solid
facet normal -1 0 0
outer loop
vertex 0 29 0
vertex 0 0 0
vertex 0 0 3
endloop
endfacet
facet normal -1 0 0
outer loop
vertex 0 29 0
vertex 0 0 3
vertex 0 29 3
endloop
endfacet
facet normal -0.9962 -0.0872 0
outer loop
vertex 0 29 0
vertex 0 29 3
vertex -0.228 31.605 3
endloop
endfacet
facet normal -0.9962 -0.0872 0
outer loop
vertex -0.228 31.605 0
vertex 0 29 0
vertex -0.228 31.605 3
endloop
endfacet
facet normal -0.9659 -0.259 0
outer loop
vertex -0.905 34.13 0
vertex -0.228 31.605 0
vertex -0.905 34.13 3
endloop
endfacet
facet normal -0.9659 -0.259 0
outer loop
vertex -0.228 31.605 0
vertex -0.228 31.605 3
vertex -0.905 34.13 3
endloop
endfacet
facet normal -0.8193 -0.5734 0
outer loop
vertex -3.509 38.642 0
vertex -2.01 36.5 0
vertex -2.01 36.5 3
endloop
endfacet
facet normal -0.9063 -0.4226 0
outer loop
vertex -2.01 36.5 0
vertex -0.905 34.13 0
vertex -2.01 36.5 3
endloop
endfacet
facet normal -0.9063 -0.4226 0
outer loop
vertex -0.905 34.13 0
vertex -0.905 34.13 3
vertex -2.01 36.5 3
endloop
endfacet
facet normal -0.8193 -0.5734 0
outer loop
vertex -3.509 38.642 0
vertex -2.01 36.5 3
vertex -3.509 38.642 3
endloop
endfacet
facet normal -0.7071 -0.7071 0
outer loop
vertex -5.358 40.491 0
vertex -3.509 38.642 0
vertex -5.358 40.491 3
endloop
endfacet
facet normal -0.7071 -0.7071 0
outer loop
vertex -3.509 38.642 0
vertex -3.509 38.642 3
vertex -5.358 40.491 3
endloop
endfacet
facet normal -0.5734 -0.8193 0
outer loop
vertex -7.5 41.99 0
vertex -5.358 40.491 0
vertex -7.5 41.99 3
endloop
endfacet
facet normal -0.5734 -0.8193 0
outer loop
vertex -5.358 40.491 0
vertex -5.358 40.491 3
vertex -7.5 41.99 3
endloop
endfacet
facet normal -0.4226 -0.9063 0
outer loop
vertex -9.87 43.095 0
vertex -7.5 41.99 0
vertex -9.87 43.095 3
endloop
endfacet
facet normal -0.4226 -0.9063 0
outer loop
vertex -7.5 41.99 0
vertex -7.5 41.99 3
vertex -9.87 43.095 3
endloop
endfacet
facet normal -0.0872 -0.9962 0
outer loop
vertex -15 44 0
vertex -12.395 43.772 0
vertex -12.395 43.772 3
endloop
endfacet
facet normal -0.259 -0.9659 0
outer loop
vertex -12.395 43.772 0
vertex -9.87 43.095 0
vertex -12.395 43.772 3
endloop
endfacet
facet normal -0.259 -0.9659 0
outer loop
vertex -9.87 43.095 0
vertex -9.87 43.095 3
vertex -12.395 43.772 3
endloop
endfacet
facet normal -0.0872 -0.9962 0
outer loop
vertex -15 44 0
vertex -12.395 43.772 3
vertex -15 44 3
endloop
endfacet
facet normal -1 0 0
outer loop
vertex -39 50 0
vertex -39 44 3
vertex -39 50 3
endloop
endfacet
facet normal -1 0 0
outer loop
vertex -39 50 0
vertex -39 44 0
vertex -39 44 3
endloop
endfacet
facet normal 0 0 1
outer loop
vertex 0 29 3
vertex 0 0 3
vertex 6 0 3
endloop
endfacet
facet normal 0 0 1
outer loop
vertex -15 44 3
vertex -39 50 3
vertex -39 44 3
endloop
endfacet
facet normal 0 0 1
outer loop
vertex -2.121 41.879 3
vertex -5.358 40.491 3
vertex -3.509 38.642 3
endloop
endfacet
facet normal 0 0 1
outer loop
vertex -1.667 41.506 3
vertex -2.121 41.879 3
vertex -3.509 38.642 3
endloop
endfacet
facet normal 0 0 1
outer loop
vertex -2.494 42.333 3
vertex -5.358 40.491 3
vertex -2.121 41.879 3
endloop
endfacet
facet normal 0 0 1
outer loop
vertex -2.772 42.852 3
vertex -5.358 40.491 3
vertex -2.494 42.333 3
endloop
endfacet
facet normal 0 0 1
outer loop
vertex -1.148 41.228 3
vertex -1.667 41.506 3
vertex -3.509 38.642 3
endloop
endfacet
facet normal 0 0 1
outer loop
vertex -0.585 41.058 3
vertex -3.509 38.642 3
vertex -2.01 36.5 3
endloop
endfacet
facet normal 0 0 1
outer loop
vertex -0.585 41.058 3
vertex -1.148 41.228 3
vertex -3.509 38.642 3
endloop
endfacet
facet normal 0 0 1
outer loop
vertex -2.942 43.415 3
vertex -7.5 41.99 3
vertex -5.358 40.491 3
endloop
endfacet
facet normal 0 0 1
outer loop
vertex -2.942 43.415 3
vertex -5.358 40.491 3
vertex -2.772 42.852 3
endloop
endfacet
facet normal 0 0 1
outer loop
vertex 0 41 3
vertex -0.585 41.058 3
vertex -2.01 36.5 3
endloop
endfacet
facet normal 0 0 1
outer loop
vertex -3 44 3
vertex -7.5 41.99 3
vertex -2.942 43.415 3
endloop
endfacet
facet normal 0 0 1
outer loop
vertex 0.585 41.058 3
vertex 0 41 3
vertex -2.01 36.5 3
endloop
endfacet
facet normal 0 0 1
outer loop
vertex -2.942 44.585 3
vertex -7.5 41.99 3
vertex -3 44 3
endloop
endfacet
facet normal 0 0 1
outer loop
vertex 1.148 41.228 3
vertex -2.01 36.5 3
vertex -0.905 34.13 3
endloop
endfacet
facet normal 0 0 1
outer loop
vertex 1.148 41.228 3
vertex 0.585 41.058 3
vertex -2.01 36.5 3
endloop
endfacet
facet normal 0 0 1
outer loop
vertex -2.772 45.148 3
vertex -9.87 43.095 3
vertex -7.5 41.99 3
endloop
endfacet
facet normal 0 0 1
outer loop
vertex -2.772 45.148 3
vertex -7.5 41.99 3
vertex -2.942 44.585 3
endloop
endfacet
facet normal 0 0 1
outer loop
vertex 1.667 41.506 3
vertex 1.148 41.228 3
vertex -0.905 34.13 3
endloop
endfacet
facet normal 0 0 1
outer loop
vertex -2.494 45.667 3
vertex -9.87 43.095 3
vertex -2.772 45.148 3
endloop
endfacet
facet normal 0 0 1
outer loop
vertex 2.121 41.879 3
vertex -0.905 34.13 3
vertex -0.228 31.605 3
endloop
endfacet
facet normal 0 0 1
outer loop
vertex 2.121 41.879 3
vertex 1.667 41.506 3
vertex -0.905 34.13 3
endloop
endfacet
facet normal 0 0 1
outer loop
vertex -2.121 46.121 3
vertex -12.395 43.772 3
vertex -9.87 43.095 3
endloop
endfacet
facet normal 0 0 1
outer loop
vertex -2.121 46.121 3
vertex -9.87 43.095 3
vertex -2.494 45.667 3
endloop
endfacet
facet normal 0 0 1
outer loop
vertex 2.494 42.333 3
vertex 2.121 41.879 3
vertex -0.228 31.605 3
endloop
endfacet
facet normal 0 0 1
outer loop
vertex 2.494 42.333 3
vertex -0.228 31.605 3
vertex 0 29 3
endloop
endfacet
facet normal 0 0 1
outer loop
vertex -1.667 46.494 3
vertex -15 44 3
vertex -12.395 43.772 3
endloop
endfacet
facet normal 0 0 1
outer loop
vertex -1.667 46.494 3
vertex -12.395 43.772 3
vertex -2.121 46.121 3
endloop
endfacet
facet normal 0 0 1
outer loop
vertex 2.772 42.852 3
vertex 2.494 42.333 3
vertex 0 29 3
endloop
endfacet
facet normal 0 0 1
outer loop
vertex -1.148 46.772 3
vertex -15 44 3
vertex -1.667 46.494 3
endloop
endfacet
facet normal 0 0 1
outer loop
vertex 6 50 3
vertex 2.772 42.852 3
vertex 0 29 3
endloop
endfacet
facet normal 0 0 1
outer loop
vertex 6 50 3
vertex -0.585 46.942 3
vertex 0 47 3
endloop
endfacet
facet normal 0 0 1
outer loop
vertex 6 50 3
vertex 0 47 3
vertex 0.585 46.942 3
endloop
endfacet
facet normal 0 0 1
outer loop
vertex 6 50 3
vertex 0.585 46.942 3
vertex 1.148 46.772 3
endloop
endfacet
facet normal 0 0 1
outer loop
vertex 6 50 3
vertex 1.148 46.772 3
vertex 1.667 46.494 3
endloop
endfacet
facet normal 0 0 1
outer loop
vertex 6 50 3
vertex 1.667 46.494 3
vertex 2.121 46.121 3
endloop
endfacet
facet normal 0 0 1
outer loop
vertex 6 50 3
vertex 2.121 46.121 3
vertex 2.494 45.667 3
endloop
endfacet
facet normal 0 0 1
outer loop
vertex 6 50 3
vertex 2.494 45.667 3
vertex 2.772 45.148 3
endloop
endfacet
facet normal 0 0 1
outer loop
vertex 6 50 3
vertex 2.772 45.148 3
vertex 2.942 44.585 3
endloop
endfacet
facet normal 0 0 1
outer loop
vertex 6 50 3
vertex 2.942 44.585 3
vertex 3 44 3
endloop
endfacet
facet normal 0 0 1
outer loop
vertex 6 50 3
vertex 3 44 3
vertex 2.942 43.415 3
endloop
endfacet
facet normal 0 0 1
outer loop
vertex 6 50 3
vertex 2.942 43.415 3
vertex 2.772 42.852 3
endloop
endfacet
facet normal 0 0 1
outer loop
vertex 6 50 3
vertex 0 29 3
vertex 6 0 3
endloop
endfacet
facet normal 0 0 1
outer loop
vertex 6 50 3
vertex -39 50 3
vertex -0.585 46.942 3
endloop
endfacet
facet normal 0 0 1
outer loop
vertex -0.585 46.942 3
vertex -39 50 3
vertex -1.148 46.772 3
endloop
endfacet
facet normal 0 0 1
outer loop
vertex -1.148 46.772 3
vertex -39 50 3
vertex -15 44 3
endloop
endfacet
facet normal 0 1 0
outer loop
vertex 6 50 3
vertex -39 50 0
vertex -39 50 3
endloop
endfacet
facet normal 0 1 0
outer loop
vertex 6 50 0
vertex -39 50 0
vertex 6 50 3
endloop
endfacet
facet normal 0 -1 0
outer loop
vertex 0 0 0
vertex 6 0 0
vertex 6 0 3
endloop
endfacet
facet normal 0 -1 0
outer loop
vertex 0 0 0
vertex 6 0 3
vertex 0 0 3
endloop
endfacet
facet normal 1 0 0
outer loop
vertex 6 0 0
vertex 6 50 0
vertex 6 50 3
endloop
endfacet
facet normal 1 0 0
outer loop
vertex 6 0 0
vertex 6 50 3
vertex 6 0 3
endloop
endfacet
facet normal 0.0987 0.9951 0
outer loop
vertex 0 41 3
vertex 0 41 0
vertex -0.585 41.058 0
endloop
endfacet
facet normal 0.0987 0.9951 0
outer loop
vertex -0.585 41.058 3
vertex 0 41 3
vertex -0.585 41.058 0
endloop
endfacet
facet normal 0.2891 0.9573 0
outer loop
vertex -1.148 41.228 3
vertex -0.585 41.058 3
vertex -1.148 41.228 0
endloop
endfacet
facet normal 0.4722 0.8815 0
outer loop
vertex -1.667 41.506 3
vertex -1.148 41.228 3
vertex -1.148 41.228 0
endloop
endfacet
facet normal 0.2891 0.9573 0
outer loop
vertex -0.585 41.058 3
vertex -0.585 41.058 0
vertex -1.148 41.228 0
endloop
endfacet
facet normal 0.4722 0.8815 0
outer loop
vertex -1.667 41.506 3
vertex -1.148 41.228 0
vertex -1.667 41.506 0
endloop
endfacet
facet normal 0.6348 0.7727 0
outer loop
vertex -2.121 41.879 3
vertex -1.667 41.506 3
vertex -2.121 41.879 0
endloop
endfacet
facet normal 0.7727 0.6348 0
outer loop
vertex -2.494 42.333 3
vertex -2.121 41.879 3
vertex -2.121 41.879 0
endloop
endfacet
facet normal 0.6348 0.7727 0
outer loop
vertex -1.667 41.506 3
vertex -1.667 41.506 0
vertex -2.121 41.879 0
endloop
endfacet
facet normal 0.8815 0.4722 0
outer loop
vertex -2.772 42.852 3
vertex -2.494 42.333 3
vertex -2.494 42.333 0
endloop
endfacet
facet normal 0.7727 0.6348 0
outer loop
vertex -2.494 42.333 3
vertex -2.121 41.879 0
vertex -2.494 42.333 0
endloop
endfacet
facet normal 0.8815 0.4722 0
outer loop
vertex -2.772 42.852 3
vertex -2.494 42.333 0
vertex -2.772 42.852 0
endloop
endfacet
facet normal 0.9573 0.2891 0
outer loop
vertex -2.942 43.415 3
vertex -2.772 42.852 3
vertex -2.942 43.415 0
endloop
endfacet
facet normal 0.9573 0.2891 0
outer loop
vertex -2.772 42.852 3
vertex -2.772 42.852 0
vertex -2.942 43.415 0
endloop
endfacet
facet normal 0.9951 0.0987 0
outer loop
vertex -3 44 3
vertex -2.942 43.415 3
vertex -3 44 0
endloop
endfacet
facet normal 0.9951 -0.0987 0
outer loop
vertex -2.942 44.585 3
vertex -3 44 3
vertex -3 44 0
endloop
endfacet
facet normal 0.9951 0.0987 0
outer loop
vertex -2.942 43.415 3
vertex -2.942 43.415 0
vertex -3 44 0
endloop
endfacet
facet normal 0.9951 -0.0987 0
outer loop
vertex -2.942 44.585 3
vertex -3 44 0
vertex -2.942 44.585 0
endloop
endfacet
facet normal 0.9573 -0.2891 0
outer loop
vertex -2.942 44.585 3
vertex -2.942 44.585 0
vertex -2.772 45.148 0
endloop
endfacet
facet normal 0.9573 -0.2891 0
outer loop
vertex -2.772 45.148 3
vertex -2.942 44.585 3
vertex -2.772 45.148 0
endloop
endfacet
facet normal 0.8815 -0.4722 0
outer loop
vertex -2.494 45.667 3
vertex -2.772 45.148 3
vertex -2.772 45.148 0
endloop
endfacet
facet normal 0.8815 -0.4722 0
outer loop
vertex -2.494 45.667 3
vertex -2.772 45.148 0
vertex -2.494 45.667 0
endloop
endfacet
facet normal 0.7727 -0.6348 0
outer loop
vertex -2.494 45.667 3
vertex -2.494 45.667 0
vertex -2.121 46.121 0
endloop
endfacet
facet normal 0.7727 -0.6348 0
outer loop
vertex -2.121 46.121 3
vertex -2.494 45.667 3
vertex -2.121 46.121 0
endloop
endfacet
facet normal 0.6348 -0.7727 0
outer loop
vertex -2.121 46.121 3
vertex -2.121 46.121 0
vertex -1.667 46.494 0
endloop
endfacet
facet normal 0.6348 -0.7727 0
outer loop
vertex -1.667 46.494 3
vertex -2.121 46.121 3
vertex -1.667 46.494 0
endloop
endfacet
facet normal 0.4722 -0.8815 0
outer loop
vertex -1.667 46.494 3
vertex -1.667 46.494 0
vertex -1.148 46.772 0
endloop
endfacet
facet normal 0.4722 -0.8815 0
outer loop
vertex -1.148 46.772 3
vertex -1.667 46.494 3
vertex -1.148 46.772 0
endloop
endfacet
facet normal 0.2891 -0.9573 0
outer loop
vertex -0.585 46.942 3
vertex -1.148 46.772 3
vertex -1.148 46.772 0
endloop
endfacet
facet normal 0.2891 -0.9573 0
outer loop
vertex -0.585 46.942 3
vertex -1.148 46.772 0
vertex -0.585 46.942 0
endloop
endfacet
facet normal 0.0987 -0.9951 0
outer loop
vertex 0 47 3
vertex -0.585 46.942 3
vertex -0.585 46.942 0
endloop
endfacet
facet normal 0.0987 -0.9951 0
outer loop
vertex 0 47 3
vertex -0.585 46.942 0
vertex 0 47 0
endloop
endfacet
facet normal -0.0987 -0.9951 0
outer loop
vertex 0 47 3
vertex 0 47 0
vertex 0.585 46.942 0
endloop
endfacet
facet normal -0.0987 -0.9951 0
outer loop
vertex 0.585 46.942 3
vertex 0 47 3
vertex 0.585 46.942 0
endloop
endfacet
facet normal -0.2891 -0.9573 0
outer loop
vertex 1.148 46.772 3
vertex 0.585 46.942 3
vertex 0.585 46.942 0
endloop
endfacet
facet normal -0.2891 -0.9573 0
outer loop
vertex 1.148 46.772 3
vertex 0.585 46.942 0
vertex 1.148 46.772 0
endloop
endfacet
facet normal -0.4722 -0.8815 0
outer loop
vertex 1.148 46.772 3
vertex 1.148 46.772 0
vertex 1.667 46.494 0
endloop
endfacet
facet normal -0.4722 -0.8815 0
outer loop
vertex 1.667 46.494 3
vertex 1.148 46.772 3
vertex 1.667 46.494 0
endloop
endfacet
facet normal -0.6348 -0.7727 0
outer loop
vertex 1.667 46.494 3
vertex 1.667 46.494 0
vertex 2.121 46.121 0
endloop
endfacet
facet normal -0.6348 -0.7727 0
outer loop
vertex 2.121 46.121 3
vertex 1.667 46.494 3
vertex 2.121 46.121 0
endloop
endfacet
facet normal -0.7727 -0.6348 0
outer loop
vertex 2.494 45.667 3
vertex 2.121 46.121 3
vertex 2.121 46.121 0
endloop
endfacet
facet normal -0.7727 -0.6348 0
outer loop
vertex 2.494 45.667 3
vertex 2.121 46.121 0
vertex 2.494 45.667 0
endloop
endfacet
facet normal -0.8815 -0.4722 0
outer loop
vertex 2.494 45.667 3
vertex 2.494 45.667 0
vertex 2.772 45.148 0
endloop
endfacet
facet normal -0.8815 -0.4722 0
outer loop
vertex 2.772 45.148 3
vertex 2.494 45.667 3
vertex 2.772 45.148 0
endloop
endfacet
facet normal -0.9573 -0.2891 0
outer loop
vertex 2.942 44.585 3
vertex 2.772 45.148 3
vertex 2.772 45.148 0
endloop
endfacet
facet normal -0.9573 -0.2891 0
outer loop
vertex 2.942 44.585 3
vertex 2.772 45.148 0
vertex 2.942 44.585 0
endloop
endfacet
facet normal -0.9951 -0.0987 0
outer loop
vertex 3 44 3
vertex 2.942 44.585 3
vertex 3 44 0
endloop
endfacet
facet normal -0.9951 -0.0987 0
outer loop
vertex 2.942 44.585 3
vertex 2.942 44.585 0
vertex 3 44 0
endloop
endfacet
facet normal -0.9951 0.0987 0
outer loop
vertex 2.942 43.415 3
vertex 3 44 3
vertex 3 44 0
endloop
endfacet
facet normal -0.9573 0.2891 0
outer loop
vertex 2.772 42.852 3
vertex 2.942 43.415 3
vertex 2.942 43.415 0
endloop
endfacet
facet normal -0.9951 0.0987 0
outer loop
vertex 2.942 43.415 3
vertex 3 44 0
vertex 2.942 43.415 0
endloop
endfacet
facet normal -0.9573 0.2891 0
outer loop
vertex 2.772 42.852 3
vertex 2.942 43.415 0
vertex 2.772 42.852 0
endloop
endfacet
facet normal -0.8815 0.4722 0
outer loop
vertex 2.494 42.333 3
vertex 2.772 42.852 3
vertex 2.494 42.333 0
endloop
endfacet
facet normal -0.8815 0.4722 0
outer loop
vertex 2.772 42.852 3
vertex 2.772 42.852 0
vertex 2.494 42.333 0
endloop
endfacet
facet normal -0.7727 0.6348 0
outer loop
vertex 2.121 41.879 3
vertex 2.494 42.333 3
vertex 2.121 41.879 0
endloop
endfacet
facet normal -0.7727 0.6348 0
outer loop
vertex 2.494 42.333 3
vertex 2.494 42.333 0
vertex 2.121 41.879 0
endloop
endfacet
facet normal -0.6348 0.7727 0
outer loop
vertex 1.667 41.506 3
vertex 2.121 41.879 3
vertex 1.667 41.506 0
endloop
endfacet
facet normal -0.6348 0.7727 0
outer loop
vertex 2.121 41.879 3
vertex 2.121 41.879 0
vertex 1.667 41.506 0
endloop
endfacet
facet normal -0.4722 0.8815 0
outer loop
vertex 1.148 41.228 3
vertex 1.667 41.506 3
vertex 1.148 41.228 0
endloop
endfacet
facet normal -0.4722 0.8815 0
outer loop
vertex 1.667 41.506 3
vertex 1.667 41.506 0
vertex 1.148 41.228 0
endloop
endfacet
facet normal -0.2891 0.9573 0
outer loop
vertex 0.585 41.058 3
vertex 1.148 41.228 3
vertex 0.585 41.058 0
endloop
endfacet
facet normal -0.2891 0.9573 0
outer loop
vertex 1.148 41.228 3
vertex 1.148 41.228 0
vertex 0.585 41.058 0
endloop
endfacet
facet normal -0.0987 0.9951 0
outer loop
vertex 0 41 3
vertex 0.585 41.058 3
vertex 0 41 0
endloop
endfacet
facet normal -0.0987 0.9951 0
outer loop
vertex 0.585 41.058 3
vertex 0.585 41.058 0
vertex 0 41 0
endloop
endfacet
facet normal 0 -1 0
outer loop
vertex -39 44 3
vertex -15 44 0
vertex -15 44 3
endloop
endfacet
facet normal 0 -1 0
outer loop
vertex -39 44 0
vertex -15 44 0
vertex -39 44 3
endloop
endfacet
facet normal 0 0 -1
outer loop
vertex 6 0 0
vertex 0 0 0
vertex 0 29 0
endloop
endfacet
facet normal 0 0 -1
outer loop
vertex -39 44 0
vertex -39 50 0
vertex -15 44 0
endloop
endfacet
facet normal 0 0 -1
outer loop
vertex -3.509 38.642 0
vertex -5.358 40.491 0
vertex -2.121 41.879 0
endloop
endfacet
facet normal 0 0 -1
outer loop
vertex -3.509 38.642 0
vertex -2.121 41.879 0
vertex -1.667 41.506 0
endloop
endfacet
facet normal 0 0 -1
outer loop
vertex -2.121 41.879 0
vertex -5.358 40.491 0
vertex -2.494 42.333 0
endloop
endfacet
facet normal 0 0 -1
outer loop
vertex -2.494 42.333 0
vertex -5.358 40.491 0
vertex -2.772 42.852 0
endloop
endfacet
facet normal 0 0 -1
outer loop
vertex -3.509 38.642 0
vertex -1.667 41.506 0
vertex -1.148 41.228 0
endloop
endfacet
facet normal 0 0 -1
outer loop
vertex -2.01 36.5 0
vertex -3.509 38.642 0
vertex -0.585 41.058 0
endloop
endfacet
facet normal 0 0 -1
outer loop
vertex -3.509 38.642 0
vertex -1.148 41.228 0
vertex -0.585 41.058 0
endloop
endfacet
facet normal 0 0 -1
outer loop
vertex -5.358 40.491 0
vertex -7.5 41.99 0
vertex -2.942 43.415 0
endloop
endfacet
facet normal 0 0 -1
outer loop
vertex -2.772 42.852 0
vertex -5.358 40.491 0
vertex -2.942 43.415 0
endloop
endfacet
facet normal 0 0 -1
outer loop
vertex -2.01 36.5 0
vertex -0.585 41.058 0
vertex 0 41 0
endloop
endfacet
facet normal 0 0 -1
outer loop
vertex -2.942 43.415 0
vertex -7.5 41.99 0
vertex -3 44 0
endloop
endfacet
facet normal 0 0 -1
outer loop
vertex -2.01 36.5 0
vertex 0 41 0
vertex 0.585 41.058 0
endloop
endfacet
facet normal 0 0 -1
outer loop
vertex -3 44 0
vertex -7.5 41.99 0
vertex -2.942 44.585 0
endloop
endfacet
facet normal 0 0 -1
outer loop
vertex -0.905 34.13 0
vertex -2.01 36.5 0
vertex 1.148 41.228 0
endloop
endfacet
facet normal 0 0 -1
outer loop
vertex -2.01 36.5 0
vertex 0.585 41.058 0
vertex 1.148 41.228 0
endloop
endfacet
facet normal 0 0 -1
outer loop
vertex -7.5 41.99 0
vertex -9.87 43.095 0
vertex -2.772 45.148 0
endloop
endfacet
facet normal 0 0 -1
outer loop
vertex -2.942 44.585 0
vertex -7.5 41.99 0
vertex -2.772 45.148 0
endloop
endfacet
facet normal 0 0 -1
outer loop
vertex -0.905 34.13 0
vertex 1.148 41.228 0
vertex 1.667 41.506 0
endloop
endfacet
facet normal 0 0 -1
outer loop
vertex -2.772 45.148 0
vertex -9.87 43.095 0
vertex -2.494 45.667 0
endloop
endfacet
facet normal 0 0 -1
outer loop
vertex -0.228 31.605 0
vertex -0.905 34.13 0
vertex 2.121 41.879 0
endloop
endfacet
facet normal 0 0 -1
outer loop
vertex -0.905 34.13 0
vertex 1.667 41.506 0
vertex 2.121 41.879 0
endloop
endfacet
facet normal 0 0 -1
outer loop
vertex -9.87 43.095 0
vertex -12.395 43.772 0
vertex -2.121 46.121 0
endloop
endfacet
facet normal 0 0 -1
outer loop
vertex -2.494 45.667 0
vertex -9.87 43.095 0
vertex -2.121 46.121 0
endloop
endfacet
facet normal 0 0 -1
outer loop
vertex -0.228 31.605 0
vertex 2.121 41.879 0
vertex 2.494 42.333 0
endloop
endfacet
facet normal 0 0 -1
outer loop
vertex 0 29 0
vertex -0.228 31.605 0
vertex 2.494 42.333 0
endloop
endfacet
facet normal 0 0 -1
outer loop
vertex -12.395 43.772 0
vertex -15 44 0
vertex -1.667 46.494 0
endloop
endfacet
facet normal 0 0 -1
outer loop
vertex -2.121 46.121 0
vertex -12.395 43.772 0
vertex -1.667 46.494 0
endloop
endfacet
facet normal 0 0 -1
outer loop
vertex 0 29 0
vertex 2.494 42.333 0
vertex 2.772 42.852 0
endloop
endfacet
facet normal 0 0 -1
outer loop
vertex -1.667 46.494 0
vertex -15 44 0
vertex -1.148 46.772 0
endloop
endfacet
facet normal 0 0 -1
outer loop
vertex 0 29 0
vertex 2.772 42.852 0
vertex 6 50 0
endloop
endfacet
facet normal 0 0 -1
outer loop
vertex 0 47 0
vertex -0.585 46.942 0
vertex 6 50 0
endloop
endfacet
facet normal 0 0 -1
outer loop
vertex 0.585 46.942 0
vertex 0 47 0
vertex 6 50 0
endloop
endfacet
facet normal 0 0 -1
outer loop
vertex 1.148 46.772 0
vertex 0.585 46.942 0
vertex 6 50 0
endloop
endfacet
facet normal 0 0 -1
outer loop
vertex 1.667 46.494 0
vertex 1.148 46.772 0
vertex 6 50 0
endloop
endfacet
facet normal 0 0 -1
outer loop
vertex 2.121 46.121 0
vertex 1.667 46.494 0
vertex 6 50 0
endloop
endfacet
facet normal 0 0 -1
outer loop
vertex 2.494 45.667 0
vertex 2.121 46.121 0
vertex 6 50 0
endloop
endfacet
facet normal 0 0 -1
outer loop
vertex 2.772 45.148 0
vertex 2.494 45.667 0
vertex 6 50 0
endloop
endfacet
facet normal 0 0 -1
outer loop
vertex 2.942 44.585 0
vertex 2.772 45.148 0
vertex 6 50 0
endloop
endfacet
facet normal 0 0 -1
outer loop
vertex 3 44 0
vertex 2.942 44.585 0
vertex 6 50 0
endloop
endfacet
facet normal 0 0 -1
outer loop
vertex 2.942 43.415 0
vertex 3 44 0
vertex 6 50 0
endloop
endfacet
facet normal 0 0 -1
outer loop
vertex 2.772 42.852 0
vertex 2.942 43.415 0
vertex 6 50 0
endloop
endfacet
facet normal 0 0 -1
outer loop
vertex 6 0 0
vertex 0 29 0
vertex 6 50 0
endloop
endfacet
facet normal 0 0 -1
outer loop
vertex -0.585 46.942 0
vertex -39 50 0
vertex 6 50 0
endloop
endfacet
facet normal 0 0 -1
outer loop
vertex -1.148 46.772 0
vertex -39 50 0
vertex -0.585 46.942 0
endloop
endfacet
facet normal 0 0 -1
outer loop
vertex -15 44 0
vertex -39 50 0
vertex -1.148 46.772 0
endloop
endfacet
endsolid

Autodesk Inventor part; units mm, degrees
ref_plane "YZ Plane" through (0, 0, 0) normal (1, 0, 0) x (0, 1, 0)
ref_plane "XZ Plane" through (0, 0, 0) normal (0, 1, 0) x (-1, 0, 0)
ref_plane "XY Plane" through (0, 0, 0) normal (0, 0, 1) x (1, 0, 0)
sketch "Sketch1" plane through (0, 0, 0) normal (0, 0, 1) x (1, 0, 0)
  line L0 (-39, 50) -> (6, 50)
  line L1 (6, 50) -> (6, 44)
  line L2 (6, 44) -> (-39, 44)
  line L3 (-39, 44) -> (-39, 50)
  line L4 (0, 44) -> (6, 44)
  line L5 (6, 44) -> (6, 0)
  line L6 (6, 0) -> (0, 0)
  line L7 (0, 0) -> (0, 44)
  dimension "d1" = 6
  dimension "d2" = 45
  dimension "d3" = 6
  dimension "d17" = 50
extrude "Extrusion1" add sketch "Sketch1" along normal blind 3
fillet "Fillet1" radius 15 1 edges at (0, 44, 1.5)
sketch "Sketch2" plane through (0, 0, 3) normal (0, 0, 1) x (1, 0, 0)
  line L0 (6, 50) -> (-39, 50) projected
  line L1 (6, 0) -> (6, 50) projected
  point P0 (0, 0)
  point P1 (0, 44)
  dimension "d8" = 6
  dimension "d9" = 6
hole "Hole1" at (0, 44, 3) direction (0, 0, -1) diameter 6 end through all
equation "\"d3\" = d1"
equation "\"d9\" = d8"
properties part number "Selection_Selector 1" material "Nylon 6/6"
